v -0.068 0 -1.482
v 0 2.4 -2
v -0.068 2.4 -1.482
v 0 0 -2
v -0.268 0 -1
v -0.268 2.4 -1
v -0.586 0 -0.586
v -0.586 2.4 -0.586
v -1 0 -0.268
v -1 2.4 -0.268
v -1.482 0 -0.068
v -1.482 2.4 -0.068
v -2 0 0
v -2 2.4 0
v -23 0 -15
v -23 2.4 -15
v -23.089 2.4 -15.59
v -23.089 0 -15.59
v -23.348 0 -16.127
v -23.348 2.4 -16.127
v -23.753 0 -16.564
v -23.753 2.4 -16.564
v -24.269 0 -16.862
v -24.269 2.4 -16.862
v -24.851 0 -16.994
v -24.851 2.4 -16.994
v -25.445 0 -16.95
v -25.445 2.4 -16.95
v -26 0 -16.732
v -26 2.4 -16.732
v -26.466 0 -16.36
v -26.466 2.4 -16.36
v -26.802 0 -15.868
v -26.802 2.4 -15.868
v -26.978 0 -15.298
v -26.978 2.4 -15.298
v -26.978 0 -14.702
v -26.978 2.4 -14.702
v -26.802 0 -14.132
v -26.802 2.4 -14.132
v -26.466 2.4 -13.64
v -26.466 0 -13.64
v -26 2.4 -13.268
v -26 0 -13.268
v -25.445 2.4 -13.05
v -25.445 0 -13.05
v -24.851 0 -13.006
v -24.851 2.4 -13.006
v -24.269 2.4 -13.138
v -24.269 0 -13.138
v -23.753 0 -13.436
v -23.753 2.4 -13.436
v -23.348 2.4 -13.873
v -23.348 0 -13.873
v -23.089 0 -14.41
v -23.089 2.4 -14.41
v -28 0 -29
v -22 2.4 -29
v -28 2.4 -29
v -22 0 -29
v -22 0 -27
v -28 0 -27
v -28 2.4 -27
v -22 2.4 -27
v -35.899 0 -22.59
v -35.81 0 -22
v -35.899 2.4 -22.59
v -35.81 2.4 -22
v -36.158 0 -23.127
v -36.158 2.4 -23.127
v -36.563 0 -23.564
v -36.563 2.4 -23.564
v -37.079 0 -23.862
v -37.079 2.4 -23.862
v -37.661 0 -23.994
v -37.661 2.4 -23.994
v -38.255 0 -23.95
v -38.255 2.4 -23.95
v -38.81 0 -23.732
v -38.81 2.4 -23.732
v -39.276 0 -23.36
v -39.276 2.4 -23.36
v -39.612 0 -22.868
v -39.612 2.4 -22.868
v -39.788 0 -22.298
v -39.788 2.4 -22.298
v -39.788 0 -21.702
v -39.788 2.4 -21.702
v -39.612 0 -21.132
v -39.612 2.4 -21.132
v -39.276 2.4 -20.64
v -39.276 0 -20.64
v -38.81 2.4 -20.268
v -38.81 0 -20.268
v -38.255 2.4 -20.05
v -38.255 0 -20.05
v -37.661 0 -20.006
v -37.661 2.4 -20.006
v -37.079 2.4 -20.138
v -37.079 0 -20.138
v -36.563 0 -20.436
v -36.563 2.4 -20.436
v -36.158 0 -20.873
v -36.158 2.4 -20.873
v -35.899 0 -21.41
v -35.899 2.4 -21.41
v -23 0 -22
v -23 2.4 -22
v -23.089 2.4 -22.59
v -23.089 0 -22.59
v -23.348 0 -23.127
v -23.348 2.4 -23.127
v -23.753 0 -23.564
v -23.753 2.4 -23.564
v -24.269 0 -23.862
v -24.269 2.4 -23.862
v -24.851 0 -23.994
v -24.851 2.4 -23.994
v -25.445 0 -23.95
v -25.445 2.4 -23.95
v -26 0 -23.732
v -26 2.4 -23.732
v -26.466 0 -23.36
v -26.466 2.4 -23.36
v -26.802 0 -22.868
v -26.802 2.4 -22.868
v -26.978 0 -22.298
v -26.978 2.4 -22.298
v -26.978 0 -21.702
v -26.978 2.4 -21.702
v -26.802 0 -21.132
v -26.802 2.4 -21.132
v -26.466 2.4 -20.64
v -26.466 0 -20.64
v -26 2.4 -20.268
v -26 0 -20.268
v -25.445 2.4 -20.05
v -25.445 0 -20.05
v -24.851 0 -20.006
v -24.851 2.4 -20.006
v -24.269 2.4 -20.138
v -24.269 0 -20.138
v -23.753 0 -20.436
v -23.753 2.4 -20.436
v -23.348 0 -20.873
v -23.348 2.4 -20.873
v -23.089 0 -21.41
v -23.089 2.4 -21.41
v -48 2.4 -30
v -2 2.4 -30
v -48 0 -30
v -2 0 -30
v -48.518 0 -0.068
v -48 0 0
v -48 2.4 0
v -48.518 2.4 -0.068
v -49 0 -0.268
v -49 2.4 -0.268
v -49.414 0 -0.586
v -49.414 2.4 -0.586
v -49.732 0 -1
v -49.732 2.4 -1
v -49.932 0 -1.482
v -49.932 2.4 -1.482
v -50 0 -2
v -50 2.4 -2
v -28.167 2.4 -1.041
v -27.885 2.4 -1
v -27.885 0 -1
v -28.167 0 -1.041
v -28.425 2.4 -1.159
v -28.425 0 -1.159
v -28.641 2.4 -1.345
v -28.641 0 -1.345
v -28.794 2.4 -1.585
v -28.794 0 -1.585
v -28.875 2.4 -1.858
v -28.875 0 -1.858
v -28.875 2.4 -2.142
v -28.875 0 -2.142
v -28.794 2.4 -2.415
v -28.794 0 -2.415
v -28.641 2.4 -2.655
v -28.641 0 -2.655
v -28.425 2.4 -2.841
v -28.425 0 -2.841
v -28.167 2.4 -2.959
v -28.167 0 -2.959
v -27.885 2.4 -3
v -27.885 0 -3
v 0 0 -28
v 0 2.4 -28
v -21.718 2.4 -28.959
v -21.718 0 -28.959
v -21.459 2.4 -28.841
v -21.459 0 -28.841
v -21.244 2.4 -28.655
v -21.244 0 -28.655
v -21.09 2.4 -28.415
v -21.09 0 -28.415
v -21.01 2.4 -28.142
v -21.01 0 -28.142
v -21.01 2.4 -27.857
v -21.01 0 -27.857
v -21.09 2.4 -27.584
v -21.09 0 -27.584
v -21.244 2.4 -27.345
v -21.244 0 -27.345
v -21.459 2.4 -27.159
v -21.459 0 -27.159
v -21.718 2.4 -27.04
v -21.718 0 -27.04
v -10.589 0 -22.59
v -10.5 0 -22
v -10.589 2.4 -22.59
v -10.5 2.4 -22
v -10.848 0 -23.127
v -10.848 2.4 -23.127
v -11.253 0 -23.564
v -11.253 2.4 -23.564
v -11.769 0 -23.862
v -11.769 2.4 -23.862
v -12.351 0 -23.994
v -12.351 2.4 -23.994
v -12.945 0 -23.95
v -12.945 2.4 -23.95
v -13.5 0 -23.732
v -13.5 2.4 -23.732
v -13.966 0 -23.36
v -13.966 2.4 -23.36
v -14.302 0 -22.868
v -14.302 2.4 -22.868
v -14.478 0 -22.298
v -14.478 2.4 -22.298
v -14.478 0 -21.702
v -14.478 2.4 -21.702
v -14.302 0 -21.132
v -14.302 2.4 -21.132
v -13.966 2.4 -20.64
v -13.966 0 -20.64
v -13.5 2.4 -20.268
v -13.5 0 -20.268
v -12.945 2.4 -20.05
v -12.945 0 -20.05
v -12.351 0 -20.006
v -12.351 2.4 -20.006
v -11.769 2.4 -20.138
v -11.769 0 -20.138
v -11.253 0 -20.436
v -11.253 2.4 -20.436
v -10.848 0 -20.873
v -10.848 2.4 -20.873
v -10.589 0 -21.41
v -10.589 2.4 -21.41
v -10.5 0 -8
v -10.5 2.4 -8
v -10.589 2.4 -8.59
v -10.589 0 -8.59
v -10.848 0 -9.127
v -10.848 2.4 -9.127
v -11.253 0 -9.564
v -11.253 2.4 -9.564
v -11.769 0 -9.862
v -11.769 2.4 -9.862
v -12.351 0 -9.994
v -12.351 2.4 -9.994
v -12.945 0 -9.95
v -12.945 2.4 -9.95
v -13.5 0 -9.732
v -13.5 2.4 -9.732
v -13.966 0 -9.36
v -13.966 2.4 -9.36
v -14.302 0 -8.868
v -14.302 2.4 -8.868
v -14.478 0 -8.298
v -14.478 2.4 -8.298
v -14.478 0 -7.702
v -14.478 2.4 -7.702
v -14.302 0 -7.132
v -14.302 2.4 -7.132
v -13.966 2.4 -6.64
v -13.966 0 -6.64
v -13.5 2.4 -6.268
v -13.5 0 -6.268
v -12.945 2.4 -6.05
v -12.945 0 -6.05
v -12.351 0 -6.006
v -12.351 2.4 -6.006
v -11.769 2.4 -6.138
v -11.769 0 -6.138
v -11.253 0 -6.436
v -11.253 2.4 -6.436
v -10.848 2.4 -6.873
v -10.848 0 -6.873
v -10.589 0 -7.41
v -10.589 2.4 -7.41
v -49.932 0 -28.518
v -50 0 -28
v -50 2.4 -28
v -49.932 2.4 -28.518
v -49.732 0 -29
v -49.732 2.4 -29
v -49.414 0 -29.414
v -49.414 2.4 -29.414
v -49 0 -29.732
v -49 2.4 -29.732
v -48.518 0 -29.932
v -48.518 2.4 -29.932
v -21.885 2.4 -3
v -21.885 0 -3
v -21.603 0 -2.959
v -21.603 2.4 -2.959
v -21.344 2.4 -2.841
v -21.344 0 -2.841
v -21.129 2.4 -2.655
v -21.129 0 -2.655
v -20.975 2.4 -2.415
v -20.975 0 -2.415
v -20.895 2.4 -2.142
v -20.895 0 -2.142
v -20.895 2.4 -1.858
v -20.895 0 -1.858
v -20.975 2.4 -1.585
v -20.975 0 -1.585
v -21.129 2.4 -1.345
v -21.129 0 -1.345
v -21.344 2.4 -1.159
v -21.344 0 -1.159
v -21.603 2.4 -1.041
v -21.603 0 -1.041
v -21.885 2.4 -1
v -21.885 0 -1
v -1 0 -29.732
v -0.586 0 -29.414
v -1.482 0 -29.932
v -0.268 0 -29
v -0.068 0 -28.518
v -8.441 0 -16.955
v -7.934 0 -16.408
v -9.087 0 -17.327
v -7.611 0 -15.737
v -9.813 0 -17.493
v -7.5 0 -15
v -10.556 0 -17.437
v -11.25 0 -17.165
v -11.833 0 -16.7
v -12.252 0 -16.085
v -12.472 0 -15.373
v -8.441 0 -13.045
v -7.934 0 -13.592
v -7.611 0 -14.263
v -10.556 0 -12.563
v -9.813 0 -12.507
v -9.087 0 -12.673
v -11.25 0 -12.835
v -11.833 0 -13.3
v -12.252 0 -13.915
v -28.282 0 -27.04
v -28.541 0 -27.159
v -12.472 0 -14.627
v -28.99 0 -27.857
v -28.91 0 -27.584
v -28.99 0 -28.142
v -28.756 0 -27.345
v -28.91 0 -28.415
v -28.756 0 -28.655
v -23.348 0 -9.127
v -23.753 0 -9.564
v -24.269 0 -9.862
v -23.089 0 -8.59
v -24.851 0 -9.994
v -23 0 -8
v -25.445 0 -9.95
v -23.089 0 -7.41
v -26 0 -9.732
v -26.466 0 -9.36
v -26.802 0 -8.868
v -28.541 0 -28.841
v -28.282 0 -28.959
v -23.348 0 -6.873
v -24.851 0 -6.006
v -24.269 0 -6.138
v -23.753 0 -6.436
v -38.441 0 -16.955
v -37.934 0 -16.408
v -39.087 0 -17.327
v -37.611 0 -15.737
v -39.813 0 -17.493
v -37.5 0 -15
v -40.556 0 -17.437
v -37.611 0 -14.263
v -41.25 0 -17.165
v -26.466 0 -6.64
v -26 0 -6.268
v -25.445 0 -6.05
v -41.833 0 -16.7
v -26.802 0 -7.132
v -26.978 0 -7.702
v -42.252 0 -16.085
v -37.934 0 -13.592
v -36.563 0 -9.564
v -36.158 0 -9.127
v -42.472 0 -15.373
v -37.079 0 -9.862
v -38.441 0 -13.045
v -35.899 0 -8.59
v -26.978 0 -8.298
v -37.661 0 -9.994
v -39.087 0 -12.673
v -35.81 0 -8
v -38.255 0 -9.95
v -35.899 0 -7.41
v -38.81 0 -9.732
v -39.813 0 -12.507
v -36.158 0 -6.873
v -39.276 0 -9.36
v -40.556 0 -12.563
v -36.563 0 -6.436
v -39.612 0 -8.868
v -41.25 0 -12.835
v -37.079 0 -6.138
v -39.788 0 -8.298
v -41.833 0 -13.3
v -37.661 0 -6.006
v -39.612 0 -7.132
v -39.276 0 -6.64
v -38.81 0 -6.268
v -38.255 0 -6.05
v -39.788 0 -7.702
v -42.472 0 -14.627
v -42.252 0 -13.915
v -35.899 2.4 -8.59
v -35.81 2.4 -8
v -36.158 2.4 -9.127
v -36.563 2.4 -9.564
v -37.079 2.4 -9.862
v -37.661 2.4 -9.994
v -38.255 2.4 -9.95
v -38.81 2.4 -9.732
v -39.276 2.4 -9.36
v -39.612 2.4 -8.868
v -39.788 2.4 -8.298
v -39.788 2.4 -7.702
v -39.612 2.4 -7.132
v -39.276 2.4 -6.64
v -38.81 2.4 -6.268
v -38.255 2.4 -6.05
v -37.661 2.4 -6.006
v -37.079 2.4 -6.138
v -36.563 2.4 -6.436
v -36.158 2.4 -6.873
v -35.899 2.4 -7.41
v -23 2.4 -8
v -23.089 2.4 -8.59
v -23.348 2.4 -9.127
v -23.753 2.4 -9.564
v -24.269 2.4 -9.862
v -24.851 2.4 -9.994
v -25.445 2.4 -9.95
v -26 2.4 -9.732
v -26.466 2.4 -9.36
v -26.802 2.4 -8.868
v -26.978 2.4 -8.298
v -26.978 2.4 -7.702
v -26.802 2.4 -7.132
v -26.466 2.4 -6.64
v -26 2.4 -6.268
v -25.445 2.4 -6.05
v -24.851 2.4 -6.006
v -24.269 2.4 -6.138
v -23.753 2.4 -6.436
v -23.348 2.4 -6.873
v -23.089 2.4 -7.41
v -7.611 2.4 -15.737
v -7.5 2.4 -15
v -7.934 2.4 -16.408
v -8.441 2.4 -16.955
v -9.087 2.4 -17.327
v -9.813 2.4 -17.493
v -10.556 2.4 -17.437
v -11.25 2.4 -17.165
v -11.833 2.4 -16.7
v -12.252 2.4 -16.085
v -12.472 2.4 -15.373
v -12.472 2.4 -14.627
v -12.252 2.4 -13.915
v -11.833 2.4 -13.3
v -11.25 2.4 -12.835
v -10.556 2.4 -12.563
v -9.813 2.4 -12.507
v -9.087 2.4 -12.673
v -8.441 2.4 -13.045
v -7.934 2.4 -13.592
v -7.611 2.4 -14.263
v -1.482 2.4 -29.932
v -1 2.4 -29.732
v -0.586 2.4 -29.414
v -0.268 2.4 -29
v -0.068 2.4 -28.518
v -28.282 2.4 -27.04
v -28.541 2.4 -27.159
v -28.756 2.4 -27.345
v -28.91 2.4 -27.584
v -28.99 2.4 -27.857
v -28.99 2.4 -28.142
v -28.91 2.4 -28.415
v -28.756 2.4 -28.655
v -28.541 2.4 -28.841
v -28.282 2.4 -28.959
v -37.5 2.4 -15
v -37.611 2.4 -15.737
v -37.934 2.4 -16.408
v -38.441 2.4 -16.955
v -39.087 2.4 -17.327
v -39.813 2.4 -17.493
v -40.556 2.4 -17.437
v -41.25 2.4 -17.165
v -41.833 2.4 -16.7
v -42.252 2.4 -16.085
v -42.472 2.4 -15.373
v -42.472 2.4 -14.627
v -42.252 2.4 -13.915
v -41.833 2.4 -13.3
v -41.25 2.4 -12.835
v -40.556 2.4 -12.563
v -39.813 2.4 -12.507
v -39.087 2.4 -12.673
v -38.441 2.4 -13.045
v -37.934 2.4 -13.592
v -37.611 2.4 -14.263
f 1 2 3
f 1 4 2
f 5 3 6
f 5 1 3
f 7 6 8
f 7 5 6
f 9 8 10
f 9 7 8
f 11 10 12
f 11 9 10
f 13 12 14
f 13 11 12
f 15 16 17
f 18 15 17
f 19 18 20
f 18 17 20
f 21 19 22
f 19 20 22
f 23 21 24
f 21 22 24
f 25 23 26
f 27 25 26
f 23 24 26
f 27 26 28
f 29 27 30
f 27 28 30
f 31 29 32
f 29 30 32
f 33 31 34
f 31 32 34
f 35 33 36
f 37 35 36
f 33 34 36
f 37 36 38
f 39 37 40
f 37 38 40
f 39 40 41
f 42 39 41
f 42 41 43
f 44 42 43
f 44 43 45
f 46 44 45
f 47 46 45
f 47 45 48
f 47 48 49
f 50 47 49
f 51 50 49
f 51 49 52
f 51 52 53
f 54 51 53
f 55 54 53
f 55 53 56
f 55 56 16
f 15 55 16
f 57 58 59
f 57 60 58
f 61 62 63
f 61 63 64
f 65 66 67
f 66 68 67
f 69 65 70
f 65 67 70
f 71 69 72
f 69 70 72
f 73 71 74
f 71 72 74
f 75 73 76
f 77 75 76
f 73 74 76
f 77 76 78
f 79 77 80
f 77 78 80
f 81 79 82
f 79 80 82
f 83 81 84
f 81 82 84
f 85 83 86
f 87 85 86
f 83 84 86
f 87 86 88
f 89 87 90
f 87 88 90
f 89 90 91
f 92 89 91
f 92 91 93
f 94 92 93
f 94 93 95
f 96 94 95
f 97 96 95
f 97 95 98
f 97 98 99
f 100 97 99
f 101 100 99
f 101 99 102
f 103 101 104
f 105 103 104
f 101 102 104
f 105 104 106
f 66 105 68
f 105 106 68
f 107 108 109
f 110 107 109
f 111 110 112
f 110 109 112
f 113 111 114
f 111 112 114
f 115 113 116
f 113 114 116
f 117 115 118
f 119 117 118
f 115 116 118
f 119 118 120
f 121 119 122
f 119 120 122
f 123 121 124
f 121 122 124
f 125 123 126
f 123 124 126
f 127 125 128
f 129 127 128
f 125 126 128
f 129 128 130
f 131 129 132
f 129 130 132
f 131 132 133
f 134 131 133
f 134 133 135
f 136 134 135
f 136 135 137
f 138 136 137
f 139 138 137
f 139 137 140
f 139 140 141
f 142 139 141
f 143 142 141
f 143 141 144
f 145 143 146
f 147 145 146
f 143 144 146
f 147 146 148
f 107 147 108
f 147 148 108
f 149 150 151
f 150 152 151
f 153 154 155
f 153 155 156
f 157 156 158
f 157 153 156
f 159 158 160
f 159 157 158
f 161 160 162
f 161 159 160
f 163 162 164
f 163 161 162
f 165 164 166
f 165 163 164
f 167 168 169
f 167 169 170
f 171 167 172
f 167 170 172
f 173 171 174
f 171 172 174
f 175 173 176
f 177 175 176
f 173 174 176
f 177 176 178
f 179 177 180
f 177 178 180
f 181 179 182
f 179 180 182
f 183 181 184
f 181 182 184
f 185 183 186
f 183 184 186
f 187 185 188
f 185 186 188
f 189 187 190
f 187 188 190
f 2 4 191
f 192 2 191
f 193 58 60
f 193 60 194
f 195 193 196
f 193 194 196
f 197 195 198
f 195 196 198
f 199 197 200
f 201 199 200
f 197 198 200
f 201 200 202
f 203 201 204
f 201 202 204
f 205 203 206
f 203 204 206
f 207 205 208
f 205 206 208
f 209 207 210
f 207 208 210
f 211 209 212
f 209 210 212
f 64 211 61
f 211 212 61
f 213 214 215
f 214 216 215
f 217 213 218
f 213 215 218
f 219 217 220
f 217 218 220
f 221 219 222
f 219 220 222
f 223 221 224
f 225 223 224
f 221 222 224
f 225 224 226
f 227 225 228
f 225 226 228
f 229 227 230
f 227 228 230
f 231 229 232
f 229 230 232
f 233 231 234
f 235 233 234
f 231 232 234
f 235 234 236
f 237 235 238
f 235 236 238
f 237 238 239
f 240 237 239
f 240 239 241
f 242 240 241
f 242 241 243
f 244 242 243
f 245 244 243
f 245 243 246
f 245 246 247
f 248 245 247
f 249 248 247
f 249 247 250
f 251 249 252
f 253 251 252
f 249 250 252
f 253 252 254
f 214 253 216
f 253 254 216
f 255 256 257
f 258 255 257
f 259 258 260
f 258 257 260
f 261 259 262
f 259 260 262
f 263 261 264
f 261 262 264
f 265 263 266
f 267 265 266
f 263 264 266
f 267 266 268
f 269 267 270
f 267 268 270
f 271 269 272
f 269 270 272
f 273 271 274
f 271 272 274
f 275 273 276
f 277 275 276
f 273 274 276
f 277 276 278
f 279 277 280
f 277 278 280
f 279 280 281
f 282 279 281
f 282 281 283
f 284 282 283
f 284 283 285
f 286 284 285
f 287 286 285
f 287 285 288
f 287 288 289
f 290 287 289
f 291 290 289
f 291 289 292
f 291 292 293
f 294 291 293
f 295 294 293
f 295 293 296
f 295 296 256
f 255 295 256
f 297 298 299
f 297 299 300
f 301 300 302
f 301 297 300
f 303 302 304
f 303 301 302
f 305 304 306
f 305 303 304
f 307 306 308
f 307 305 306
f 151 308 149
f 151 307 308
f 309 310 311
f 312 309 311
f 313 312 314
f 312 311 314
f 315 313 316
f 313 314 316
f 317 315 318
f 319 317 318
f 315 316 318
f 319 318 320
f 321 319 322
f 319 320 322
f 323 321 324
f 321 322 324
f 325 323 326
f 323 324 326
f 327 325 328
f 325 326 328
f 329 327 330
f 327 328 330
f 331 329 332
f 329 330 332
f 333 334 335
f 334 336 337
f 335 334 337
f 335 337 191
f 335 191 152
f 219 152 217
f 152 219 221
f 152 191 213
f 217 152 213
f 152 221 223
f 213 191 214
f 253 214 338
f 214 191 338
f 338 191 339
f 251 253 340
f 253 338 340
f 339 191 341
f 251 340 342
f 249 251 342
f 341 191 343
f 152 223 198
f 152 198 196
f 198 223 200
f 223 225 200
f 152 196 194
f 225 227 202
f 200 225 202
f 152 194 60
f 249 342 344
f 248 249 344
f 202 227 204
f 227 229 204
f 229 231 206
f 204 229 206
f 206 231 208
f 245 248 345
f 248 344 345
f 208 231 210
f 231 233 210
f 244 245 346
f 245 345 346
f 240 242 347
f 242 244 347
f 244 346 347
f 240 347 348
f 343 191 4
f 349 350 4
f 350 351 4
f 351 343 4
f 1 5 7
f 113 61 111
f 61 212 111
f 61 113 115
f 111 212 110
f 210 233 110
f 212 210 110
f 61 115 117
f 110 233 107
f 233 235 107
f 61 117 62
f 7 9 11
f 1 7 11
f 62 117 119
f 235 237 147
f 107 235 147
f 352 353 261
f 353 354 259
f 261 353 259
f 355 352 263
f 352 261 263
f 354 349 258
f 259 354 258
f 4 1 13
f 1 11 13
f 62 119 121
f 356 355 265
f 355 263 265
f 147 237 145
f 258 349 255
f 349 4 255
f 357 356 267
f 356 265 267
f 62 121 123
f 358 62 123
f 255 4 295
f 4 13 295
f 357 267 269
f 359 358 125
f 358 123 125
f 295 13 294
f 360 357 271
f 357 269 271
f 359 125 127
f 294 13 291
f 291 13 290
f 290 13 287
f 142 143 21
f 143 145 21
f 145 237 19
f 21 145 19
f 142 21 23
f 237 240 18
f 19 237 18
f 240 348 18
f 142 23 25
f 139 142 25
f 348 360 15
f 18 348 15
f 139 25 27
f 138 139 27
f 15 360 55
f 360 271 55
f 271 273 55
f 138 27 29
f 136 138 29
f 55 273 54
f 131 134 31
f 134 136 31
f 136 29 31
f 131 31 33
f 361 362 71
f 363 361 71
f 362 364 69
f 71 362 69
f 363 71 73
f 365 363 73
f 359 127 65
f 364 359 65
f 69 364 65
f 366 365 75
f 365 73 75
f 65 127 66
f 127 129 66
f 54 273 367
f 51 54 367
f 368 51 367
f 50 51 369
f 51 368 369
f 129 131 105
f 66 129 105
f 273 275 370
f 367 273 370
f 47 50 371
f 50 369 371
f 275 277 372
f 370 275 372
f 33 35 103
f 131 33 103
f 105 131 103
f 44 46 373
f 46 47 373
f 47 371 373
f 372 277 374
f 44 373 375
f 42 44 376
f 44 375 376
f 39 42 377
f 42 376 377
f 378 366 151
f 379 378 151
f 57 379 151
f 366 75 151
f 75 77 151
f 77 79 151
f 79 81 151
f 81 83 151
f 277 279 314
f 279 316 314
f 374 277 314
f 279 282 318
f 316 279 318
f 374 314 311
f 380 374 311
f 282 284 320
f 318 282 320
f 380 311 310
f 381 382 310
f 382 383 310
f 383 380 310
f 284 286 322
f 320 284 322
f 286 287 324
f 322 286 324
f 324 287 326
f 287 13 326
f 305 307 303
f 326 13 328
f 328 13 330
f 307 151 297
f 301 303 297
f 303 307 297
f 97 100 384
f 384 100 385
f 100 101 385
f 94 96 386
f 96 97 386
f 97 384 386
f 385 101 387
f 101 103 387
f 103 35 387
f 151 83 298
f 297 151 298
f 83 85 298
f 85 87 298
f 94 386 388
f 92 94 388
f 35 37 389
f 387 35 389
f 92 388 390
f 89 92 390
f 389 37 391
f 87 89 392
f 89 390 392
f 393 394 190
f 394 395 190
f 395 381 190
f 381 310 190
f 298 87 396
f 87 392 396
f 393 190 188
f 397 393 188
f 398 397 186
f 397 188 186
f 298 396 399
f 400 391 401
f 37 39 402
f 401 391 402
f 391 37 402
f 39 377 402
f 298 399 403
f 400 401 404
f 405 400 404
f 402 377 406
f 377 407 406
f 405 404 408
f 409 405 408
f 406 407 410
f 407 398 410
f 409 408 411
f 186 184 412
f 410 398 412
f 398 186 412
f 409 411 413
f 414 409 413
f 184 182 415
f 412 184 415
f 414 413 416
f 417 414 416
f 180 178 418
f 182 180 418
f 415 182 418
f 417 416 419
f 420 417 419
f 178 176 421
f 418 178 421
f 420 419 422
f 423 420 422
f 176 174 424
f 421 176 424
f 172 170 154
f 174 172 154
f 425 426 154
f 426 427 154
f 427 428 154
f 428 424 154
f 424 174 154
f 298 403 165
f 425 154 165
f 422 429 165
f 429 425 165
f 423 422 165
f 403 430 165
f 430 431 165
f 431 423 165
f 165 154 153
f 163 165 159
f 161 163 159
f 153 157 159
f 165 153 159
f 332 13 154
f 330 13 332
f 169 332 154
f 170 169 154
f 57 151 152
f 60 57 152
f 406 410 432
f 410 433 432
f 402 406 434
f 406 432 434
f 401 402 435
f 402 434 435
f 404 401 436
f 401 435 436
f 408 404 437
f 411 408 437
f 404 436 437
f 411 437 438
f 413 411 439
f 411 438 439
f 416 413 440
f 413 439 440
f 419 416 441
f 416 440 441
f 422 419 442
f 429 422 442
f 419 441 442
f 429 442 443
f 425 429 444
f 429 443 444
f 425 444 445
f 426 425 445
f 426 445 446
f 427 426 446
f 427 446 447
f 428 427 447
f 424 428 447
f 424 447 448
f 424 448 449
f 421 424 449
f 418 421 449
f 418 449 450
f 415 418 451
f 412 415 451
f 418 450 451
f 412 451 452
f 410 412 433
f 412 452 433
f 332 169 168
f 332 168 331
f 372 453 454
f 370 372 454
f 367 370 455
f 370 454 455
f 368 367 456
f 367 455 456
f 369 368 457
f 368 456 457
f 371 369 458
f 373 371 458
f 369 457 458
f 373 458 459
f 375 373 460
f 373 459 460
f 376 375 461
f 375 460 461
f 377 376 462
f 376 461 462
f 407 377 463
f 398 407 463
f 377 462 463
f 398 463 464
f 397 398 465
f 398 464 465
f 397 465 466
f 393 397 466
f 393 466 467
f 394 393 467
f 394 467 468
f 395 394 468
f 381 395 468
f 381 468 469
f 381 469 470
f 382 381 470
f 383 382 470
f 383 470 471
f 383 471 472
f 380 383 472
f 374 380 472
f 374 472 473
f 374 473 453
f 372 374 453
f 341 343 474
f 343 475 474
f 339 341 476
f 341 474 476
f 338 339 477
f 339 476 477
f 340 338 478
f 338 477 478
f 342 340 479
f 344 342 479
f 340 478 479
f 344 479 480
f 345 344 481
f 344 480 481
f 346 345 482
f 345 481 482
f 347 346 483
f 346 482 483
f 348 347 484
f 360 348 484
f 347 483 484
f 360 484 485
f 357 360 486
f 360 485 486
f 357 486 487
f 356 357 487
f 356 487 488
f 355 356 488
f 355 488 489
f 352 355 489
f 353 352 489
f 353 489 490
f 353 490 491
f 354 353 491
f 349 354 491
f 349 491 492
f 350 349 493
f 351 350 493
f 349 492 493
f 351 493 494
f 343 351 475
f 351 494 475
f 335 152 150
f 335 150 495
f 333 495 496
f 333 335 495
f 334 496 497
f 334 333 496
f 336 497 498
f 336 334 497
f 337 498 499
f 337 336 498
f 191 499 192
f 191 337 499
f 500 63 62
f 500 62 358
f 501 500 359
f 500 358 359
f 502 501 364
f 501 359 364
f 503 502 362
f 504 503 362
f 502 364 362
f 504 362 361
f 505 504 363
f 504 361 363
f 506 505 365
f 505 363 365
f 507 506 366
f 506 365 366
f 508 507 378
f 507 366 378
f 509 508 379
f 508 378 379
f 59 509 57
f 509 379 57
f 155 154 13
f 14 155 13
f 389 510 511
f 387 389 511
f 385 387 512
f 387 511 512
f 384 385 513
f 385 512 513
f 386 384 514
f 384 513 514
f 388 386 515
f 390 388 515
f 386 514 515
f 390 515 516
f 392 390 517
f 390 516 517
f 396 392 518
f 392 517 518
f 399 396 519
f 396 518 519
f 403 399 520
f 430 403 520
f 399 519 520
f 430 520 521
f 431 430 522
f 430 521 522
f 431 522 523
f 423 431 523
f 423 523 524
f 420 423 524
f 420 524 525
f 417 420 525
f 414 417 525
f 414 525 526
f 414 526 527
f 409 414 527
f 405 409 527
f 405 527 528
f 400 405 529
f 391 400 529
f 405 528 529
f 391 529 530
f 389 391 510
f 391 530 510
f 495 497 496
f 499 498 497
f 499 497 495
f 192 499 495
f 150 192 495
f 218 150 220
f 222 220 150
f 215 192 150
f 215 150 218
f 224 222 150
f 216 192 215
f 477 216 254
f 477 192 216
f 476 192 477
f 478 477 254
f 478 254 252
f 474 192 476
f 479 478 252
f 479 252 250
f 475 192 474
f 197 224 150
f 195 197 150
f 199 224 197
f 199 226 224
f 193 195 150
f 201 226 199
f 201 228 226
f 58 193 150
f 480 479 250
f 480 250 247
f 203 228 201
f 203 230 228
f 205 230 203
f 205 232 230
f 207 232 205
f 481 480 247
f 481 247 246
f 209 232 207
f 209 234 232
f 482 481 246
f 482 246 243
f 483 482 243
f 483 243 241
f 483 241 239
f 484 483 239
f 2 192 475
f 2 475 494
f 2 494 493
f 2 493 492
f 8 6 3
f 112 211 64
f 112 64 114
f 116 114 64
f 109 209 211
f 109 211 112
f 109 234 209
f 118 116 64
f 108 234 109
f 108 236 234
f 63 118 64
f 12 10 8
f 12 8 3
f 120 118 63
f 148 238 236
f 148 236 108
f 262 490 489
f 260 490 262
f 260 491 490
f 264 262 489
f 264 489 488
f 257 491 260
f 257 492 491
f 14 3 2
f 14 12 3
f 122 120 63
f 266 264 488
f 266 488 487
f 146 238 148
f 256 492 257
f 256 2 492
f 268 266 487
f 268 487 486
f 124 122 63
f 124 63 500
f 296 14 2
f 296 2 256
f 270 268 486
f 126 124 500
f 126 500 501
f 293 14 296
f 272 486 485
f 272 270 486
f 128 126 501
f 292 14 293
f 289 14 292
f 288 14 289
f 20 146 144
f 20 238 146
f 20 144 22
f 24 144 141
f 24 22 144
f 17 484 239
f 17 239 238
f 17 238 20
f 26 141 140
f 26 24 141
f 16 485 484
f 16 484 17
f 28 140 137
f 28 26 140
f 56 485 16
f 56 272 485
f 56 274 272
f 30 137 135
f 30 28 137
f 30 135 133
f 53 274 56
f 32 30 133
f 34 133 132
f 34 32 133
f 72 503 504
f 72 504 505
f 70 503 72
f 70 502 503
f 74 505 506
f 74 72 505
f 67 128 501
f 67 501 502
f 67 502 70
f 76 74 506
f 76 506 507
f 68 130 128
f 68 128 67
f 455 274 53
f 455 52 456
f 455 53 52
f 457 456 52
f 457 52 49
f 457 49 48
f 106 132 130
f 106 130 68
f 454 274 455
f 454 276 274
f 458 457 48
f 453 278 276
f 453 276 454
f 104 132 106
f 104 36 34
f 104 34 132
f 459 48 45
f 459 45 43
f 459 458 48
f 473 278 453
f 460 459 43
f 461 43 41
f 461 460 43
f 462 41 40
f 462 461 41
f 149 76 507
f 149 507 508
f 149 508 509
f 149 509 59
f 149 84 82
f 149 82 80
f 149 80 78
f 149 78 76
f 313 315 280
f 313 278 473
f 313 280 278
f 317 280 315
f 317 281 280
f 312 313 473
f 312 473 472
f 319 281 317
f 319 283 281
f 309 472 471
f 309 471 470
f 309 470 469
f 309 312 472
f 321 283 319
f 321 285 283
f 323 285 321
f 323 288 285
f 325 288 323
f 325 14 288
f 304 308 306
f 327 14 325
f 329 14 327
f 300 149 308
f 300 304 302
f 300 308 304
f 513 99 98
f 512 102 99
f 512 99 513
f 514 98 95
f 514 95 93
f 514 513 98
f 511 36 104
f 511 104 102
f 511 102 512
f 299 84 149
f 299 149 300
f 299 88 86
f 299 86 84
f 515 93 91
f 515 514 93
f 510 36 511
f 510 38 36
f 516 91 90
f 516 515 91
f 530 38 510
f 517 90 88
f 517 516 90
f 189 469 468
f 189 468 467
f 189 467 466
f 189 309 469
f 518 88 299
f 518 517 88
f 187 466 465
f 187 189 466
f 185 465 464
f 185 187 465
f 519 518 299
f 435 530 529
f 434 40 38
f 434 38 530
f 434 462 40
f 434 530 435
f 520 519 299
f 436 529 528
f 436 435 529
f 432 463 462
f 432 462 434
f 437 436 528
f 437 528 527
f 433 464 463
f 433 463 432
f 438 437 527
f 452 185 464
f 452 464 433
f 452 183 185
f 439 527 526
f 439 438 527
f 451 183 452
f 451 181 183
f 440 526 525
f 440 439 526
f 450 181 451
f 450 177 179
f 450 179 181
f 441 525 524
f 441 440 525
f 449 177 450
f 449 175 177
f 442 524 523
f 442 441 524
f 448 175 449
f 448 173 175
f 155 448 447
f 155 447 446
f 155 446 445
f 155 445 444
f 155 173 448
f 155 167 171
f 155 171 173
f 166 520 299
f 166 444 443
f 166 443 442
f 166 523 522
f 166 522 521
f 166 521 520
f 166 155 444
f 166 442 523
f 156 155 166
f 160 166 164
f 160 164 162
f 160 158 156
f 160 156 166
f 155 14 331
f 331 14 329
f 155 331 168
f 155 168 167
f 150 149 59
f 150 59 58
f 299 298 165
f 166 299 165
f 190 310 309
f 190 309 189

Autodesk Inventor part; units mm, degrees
ref_plane "YZ Plane" through (0, 0, 0) normal (1, 0, 0) x (0, 1, 0)
ref_plane "XZ Plane" through (0, 0, 0) normal (0, 1, 0) x (-1, 0, 0)
ref_plane "XY Plane" through (0, 0, 0) normal (0, 0, 1) x (1, 0, 0)
sketch "Sketch1" plane through (0, 0, 0) normal (0, 1, 0) x (-1, 0, 0)
  line L0 (0, -2) -> (0, -28)
  line L1 (2, -30) -> (48, -30)
  line L2 (50, -28) -> (50, -2)
  line L3 (48, 0) -> (2, 0)
  arc A0 (50, -2) -> (48, 0) centre (48, -2) ccw
  arc A1 (48, -30) -> (50, -28) centre (48, -28) ccw
  arc A2 (0, -28) -> (2, -30) centre (2, -28) ccw
  arc A3 (2, 0) -> (0, -2) centre (2, -2) ccw
  point P0 (0, 0)
  point P1 (0, -30)
  point P2 (50, -30)
  point P3 (50, 0)
  dimension "d0" = 30
  dimension "d1" = 50
  dimension "d4" = 2
extrude "Extrusion1" add sketch "Sketch1" along normal blind 2.4
sketch "Sketch2" plane through (0, 2.4, 0) normal (0, 1, 0) x (1, 0, 0)
  line L0 (0, 2) -> (0, 28) projected
  line L1 (-50, 28) -> (-50, 2) projected
  line L2 (-50, 17.5) -> (-50, 12.5)
  line L3 (-50, 15) -> (-25, 15)
  line L4 (-25, 15) -> (-40, 15)
  line L5 (-40, 15) -> (-25, 15)
  line L6 (-25, 15) -> (-10, 15)
  circle A0 centre (-40, 15) radius 2.5
  circle A1 centre (-10, 15) radius 2.5
  dimension "d22" = 5
  dimension "d62" = 25
  dimension "d63" = 15
  dimension "d64" = 15
  dimension "d65" = 5
  dimension "d66" = 5
extrude "Extrusion2" cut sketch "Sketch2" against normal blind 2.4
sketch "Sketch3" plane through (0, 2.4, 0) normal (0, 1, 0) x (1, 0, 0)
  line L0 (0, 0) -> (-25, 0)
  line L1 (-48, 0) -> (-2, 0) projected
  line L2 (-25, 0) -> (-25, 29.9791)
  line L3 (-28, 27.9998) -> (-22, 27.9998) construction
  line L4 (-28, 26.9998) -> (-22, 26.9998)
  line L5 (-22, 28.9998) -> (-28, 28.9998)
  arc A0 (-28, 28.9998) -> (-28, 26.9998) centre (-28, 27.9998) ccw
  arc A1 (-22, 26.9998) -> (-22, 28.9998) centre (-22, 27.9998) ccw
  line L6 (-2, 30) -> (-48, 30) projected
  line L7 (-27.8848, 2) -> (-21.8848, 2) construction
  line L8 (-27.8848, 1) -> (-21.8848, 1)
  line L9 (-21.8848, 3) -> (-27.8848, 3)
  arc A2 (-27.8848, 3) -> (-27.8848, 1) centre (-27.8848, 2) ccw
  arc A3 (-21.8848, 1) -> (-21.8848, 3) centre (-21.8848, 2) ccw
  point P0 (-25, 27.9998)
  point P1 (-24.8848, 2)
  dimension "d28" = 25
  dimension "d29" = 3
  dimension "d30" = 2
  dimension "d31" = 2.0002
  dimension "d32" = 3
  dimension "d33" = 2
  dimension "d34" = 2
extrude "Extrusion3" cut sketch "Sketch3" along normal mid plane 66
sketch "Sketch5" plane through (0, 2.4, 0) normal (0, 1, 0) x (1, 0, 0)
  line L0 (0, 2) -> (0, 28) projected
  line L1 (0, 15) -> (-25, 15)
  line L2 (-25, 15) -> (-25, 22)
  circle A0 centre (-25, 22) radius 2
  line L3 (-25, 15) -> (-25, 8)
  circle A1 centre (-25, 8) radius 2
  point P0 (0, 0)
  dimension "d43" = 25
  dimension "d44" = 7
  dimension "d45" = 4
  dimension "d46" = 7
  dimension "d47" = 4
extrude "Extrusion5" cut sketch "Sketch5" against normal blind 66
sketch "Sketch6" plane through (0, 2.4, 0) normal (0, 1, 0) x (1, 0, 0)
  line L0 (0, 2) -> (0, 28) projected
  line L1 (0, 15) -> (-12.5, 15)
  line L2 (-12.5, 15) -> (-12.5, 22)
  line L3 (-12.5, 22) -> (-12.5, 8)
  circle A0 centre (-12.5, 22) radius 2
  circle A1 centre (-12.5, 8) radius 2
  line L4 (-50.3101, 15) -> (-37.8101, 15)
  line L5 (-37.8101, 15) -> (-37.8101, 22)
  line L6 (-37.8101, 22) -> (-37.8101, 8)
  circle A2 centre (-37.8101, 22) radius 2
  circle A3 centre (-37.8101, 8) radius 2
  point P0 (0, 0)
  dimension "d50" = 12.5
  dimension "d51" = 7
  dimension "d52" = 14
  dimension "d53" = 4
  dimension "d54" = 4
  dimension "d55" = 12.5
  dimension "d56" = 7
  dimension "d57" = 14
  dimension "d58" = 4
  dimension "d59" = 4
extrude "Extrusion6" cut sketch "Sketch6" against normal blind 66
sketch "Sketch7" plane through (0, 2.4, 0) normal (0, 1, 0) x (1, 0, 0)
  line L0 (-48, 0) -> (-2, 0) projected
  line L1 (-48, 0) -> (-48, 15)
  line L2 (-48, 15) -> (-25, 15)
  circle A0 centre (-25, 15) radius 2
  point P0 (0, 0)
  dimension "d67" = 15
  dimension "d68" = 4
extrude "Extrusion7" cut sketch "Sketch7" against normal through all
properties part number "Cart"
